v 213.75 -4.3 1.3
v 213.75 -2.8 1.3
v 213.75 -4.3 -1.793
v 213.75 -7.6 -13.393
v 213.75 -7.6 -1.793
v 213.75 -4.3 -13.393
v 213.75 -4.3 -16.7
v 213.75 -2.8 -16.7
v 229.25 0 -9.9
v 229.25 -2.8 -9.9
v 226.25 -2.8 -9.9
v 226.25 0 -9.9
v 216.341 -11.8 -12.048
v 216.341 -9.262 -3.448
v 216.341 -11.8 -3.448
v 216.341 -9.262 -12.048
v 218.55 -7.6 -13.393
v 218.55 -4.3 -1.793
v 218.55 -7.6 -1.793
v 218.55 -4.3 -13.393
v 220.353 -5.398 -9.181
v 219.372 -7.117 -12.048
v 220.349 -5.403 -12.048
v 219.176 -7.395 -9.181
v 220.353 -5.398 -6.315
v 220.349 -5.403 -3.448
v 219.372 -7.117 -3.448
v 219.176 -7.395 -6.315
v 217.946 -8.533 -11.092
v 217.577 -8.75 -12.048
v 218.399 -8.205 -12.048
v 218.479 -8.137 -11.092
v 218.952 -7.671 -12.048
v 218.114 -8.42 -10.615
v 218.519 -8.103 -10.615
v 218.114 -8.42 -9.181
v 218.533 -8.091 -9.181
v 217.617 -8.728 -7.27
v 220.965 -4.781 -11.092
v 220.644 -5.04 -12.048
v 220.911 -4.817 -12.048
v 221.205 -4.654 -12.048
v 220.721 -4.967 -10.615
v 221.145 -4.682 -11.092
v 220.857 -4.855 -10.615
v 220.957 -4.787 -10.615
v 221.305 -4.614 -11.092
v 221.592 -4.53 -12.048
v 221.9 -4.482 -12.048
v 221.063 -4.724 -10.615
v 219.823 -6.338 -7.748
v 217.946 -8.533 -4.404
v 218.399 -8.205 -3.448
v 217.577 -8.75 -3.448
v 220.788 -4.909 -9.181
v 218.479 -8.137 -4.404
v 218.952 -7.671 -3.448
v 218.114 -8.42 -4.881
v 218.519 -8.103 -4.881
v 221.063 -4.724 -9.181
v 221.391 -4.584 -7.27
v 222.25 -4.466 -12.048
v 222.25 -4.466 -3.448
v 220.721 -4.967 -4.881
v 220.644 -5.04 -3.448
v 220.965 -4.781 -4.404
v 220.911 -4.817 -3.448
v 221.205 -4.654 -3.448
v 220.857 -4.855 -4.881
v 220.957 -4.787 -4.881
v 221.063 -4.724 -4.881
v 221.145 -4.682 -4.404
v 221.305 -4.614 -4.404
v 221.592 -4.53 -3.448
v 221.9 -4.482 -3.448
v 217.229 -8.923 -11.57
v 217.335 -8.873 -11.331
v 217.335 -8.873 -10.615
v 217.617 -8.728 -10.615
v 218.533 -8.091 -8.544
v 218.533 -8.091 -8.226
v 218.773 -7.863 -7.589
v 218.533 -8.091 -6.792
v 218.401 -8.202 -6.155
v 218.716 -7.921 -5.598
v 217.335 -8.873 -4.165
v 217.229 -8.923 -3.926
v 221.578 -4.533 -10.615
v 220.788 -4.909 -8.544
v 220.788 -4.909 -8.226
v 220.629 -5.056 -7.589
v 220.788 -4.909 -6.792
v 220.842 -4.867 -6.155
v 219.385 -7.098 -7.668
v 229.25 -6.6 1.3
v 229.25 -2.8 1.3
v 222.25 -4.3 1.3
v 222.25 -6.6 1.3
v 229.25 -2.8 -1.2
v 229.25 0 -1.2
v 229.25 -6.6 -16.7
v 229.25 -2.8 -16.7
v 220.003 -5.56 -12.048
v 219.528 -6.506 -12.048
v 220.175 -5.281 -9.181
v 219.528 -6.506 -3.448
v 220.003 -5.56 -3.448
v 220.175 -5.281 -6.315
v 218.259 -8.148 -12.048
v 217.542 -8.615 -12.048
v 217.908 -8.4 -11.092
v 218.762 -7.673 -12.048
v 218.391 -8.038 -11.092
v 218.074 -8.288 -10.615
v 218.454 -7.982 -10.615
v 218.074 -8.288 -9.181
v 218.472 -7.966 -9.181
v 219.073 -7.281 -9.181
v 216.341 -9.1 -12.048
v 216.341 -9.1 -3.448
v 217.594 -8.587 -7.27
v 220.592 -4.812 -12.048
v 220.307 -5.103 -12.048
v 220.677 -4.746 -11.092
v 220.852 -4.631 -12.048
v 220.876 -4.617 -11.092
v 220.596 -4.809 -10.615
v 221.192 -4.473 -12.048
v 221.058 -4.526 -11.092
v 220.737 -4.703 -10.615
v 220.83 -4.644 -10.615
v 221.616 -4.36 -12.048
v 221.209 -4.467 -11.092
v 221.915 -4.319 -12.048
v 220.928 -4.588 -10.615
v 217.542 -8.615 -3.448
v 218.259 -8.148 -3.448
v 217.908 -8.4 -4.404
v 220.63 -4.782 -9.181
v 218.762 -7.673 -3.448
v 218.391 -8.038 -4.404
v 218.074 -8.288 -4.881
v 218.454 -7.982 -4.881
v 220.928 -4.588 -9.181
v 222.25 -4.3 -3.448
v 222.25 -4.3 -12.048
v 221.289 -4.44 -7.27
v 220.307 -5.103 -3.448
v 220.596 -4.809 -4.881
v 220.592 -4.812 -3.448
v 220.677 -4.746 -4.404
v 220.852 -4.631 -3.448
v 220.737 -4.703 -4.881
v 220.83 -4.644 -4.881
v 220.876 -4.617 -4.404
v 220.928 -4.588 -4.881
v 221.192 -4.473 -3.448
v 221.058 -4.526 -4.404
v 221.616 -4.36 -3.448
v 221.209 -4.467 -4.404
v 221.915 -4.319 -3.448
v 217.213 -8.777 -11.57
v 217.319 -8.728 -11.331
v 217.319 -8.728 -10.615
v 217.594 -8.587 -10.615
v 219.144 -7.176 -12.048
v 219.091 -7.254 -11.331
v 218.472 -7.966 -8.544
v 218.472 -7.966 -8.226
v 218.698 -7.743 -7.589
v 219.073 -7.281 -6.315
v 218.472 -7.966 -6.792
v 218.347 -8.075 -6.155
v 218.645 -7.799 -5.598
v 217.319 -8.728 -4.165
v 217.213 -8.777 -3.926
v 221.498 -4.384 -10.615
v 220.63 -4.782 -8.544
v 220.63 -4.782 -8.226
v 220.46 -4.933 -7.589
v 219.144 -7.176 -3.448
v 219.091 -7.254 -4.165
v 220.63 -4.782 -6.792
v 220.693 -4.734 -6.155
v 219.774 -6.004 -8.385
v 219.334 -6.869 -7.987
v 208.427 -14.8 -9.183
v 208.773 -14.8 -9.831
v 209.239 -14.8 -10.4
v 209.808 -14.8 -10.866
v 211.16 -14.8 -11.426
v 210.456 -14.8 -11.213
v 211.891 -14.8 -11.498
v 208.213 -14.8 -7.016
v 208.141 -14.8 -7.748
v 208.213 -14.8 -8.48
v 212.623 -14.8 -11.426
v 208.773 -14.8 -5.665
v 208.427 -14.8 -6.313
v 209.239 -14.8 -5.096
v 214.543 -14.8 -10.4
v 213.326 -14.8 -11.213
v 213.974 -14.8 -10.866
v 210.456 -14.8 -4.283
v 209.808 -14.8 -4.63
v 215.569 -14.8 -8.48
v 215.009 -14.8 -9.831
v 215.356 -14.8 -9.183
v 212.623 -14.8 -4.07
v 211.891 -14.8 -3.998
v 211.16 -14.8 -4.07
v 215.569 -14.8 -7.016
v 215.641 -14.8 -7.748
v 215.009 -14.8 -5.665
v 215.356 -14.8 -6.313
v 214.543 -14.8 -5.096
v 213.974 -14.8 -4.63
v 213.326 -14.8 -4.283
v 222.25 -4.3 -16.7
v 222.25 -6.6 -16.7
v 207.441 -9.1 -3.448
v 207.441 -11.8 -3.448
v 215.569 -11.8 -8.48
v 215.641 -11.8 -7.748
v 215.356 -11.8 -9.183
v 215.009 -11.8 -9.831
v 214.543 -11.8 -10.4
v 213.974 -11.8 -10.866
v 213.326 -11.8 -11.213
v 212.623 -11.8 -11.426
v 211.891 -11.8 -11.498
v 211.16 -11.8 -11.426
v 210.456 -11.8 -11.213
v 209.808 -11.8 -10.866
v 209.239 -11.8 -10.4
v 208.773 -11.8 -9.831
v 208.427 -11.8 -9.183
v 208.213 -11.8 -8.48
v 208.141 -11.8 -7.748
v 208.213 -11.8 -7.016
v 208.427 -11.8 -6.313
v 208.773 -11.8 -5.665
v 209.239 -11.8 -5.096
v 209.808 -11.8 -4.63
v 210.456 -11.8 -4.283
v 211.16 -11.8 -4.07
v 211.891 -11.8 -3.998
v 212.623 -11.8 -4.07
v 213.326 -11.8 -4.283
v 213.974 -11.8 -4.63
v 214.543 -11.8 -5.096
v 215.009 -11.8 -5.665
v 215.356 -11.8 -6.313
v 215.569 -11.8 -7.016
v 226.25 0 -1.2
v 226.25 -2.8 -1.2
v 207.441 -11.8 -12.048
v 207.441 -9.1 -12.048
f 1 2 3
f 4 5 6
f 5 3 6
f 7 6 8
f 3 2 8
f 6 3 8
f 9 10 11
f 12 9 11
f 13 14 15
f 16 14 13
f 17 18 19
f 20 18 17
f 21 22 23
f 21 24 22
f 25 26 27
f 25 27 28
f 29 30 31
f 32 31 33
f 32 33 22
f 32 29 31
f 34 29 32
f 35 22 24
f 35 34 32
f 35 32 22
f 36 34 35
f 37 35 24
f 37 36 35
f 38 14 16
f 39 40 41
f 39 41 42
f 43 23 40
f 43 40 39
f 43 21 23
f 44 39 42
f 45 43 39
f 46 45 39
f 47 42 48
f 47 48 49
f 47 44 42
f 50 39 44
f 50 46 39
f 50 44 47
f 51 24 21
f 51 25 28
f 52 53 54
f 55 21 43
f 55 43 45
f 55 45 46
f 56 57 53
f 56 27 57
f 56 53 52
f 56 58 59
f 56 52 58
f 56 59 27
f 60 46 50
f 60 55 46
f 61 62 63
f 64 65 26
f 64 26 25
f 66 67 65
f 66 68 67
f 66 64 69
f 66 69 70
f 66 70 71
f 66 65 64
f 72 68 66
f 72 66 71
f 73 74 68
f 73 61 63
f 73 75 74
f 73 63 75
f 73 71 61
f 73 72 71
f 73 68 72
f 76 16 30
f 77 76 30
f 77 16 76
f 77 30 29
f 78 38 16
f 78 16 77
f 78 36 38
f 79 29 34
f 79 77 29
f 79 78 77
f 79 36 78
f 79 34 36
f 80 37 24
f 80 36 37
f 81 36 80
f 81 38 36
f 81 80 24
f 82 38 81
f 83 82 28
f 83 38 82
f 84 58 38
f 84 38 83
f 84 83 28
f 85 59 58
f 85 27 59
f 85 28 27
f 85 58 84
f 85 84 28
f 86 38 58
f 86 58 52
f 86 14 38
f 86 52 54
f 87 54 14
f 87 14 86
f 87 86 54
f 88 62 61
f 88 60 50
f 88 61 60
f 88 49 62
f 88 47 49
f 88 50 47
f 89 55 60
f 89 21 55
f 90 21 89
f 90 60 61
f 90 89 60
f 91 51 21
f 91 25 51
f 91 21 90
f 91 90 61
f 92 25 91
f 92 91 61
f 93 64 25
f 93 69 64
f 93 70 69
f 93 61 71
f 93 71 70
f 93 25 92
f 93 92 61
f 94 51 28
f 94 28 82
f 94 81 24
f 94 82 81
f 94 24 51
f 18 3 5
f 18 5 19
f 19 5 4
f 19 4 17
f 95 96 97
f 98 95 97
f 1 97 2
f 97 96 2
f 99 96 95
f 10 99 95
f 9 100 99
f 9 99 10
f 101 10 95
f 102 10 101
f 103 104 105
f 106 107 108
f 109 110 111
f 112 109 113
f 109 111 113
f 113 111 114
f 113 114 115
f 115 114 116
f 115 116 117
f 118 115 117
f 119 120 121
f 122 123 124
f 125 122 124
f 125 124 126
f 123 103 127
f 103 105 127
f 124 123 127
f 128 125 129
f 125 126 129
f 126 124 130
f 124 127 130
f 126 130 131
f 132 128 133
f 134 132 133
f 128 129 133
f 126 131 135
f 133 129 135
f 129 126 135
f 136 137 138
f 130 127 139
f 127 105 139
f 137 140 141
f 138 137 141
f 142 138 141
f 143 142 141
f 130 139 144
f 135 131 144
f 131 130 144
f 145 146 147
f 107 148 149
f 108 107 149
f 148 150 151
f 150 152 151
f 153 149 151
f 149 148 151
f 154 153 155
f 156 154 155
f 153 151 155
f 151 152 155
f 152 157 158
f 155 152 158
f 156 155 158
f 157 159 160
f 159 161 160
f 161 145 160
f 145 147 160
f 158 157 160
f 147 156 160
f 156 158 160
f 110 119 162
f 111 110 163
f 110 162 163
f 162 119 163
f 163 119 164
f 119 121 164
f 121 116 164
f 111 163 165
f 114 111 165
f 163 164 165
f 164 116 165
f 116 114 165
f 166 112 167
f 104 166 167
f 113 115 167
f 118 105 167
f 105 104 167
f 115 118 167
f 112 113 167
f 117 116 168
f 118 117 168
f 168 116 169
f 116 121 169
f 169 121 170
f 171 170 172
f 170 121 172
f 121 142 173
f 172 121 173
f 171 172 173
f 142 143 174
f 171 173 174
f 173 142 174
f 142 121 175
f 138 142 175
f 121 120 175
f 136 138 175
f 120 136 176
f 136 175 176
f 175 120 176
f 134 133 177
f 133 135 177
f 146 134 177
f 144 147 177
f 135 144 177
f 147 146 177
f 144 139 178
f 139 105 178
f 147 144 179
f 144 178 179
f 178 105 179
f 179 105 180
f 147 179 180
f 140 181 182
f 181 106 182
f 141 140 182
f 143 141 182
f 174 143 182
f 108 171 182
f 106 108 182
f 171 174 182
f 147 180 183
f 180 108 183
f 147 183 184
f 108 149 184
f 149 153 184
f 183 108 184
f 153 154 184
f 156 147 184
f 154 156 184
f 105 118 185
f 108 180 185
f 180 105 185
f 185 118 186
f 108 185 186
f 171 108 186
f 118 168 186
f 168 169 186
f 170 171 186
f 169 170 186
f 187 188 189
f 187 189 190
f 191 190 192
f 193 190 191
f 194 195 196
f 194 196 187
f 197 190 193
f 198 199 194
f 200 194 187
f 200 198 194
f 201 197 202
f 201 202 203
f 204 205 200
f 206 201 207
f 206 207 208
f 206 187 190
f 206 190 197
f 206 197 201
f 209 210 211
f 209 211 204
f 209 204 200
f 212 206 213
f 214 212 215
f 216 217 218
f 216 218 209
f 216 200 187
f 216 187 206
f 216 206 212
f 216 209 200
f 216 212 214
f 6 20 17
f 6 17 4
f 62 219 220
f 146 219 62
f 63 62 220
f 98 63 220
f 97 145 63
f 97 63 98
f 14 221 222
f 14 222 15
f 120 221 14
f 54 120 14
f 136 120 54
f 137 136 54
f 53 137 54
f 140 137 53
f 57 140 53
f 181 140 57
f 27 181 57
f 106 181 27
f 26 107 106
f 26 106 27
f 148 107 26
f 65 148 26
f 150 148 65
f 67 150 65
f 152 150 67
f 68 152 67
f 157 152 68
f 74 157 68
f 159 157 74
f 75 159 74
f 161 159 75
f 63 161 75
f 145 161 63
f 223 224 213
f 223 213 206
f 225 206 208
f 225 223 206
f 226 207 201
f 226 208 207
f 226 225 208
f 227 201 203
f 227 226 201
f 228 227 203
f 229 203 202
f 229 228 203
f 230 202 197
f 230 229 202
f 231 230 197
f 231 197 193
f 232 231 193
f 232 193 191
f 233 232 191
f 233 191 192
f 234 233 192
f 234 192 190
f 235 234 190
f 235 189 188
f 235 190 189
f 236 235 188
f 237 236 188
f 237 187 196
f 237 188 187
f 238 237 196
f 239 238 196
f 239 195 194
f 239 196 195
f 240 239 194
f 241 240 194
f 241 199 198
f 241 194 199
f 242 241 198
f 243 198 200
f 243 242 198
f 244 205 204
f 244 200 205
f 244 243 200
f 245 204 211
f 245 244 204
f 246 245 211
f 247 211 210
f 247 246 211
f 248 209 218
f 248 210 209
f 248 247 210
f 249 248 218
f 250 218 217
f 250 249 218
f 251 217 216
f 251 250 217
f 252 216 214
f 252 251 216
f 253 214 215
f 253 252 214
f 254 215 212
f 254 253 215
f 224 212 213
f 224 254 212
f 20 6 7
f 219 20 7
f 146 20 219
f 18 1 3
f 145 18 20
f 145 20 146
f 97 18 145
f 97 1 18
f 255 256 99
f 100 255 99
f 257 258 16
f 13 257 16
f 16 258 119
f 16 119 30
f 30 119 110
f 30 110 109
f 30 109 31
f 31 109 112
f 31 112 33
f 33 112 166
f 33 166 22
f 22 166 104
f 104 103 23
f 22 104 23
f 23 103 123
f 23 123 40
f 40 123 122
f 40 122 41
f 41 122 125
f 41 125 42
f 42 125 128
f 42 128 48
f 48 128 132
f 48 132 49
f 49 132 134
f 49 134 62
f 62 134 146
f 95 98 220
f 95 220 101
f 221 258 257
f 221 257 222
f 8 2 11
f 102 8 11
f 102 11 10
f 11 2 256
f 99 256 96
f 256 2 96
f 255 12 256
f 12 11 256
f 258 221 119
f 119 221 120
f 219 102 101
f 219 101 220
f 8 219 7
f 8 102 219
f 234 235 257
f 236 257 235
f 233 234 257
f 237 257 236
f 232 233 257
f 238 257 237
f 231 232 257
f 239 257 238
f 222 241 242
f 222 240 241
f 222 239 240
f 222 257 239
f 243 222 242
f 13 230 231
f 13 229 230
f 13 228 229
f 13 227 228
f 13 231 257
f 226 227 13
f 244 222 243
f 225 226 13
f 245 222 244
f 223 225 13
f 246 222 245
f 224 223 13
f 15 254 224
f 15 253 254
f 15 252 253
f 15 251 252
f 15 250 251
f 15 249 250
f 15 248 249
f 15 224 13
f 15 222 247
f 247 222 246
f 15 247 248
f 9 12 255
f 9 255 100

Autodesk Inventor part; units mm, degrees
ref_plane "YZ Plane" through (0, 0, 0) normal (1, 0, 0) x (0, 1, 0)
ref_plane "XZ Plane" through (0, 0, 0) normal (0, 1, 0) x (-1, 0, 0)
ref_plane "РабПлоскость1" through (116.75, -2.8, -7.7) normal (0, -1, 0) x (1, 0, 0)
sketch "Эскиз1" plane through (116.75, -2.8, -7.7) normal (0, -1, 0) x (1, 0, 0)
  line L0 (97, 9) -> (112.5, 9)
  line L1 (112.5, 9) -> (112.5, -9)
  line L2 (112.5, -9) -> (97, -9)
  line L3 (112.5, 2.2) -> (109.5, 2.2)
  line L4 (109.5, 2.2) -> (109.5, -6.5)
  line L5 (112.5, -6.5) -> (112.5, 2.2)
  line L6 (109.5, -6.5) -> (112.5, -6.5)
  line L7 (97, 9) -> (97, -9)
  point P0 (-116.75, 7.7)
  dimension "d9" = 15.5
  dimension "d10" = 3
  dimension "d11" = 8.7
  dimension "d13" = 2.5
extrude "Выдавливание1" add sketch "Эскиз1" along normal blind 1.5
sketch "Эскиз5" plane through (116.75, -2.8, -7.7) normal (0, 1, 0) x (1, 0, 0)
  line L0 (112.5, 9) -> (112.5, -9) projected
  line L1 (112.5, 2.2) -> (109.5, 2.2)
  line L2 (109.5, 2.2) -> (109.5, -6.5)
  line L3 (109.5, -6.5) -> (112.5, -6.5)
  line L4 (112.5, -6.5) -> (112.5, 2.2)
  line L5 (112.5, -9) -> (97, -9) projected
  point P0 (-116.75, -7.7)
  point P1 (112.5, -6.5)
  dimension "d14" = 3
  dimension "d15" = 8.7
  dimension "d16" = 2.5
extrude "Выдавливание5" add sketch "Эскиз5" along normal blind 2.8
sketch "Эскиз6" plane through (116.75, -4.3, -7.7) normal (0, -1, 0) x (1, 0, 0)
  line L0 (112.5, 9) -> (97, 9) projected
  line L1 (105.5, 9) -> (112.5, 9)
  line L2 (112.5, 9) -> (112.5, -9)
  line L3 (112.5, -9) -> (105.5, -9)
  line L4 (105.5, -9) -> (105.5, 9)
  point P0 (112.5, 9)
  dimension "d19" = 7
extrude "Выдавливание6" add sketch "Эскиз6" along normal blind 2.3
sketch "Эскиз7" plane through (116.75, -4.3, -7.7) normal (0, -1, 0) x (1, 0, 0)
  line L0 (97, 5.9073) -> (101.8, 5.9073)
  line L1 (101.8, 5.9073) -> (101.8, -5.6927)
  line L2 (101.8, -5.6927) -> (97, -5.6927)
  line L3 (97, -5.6927) -> (97, 5.9073)
  line L4 (97, 5.9073) -> (101.8, -5.6927) construction
  line L5 (101.8, 5.9073) -> (97, -5.6927) construction
  line L6 (97, 9) -> (97, -9) projected
  point P0 (99.4, 0.1073)
  point P1 (97, 0)
  dimension "d22" = 4.8
  dimension "d23" = 11.6
extrude "Выдавливание7" add sketch "Эскиз7" along normal blind 3.3
ref_plane "РабПлоскость3" through (116.75, -9.1, -7.7) normal (0, -1, 0) x (1, 0, 0)
sketch "Эскиз8" plane through (116.75, -9.1, -7.7) normal (0, -1, 0) x (1, 0, 0)
  line L0 (99.5911, -4.348) -> (90.6911, -4.348)
  line L1 (90.6911, -4.348) -> (90.6911, 4.252)
  line L2 (90.6911, 4.252) -> (99.5911, 4.252)
  line L3 (99.5911, 4.252) -> (99.5911, -4.348)
  line L4 (99.5911, -4.348) -> (90.6911, 4.252) construction
  line L5 (90.6911, -4.348) -> (99.5911, 4.252) construction
  point P0 (95.1411, -0.048)
  dimension "d27" = 8.9
  dimension "d28" = 8.6
extrude "Выдавливание8" add sketch "Эскиз8" along normal blind 2.7
sketch "Эскиз9" plane through (116.75, -11.8, -7.7) normal (0, -1, 0) x (1, 0, 0)
  line L0 (99.5911, 4.252) -> (90.6911, 4.252) projected
  line L1 (90.6911, 4.252) -> (90.6911, -4.348) projected
  line L2 (90.6911, -4.348) -> (99.5911, -4.348) projected
  line L3 (99.5911, -4.348) -> (99.5911, 4.252) projected
  circle A0 centre (95.1411, -0.048) radius 3.75
  line L4 (99.5911, -4.348) -> (99.5911, 4.252) projected
  line L5 (99.5911, -4.348) -> (90.6911, 4.252) construction
  line L6 (90.6911, 4.252) -> (90.6911, -4.348) projected
  line L7 (99.5911, 4.252) -> (90.6911, 4.252) projected
  line L8 (90.6911, -4.348) -> (99.5911, 4.252) construction
  point P0 (-116.75, 7.7)
  point P1 (95.1411, -0.048)
  dimension "d31" = 7.5
extrude "Выдавливание9" add sketch "Эскиз9" along normal blind 3 contours A0
sketch "Эскиз10" plane through (207.4411, -9.1, -3.448) normal (0, 0, 1) x (1, 0, 0)
  line L0 (8.9, 0) -> (8.9, -2.7) projected
  line L1 (8.9, -0.1624) -> (13.3567, 1.2413) construction
  line L2 (13.3567, 1.2413) -> (11.759, 4.6341) construction
  line L3 (11.759, 4.6341) -> (14.8089, 4.6341) construction
  spline S0 degree 3 poles (8.9, -0.1624) (13.3567, 1.2413) (11.759, 4.6341) (14.8089, 4.6341) knots 1 1 1 1 2 2 2 2
  line L4 (14.8089, 4.8) -> (14.8089, 2.5) projected
  line L5 (8.9, 0) -> (8.9, -2.7) projected
  line L6 (8.9, 0) -> (13.3148, 1.3302) construction
  line L7 (13.3148, 1.3302) -> (11.3789, 4.7272) construction
  line L8 (14.8089, 4.8) -> (6.3089, 4.8) projected
  line L9 (11.3789, 4.7272) -> (14.8089, 4.8) construction
  spline S1 degree 3 poles (8.9, 0) (13.3148, 1.3302) (11.3789, 4.7272) (14.8089, 4.8) knots 1 1 1 1 2 2 2 2
  point P0 (-207.4411, 9.1)
extrude "Выдавливание10" add sketch "Эскиз10" against normal up to surface (8.6 mm away)
properties part number "ЛЦМК0000002.00.00.00.00.04"
